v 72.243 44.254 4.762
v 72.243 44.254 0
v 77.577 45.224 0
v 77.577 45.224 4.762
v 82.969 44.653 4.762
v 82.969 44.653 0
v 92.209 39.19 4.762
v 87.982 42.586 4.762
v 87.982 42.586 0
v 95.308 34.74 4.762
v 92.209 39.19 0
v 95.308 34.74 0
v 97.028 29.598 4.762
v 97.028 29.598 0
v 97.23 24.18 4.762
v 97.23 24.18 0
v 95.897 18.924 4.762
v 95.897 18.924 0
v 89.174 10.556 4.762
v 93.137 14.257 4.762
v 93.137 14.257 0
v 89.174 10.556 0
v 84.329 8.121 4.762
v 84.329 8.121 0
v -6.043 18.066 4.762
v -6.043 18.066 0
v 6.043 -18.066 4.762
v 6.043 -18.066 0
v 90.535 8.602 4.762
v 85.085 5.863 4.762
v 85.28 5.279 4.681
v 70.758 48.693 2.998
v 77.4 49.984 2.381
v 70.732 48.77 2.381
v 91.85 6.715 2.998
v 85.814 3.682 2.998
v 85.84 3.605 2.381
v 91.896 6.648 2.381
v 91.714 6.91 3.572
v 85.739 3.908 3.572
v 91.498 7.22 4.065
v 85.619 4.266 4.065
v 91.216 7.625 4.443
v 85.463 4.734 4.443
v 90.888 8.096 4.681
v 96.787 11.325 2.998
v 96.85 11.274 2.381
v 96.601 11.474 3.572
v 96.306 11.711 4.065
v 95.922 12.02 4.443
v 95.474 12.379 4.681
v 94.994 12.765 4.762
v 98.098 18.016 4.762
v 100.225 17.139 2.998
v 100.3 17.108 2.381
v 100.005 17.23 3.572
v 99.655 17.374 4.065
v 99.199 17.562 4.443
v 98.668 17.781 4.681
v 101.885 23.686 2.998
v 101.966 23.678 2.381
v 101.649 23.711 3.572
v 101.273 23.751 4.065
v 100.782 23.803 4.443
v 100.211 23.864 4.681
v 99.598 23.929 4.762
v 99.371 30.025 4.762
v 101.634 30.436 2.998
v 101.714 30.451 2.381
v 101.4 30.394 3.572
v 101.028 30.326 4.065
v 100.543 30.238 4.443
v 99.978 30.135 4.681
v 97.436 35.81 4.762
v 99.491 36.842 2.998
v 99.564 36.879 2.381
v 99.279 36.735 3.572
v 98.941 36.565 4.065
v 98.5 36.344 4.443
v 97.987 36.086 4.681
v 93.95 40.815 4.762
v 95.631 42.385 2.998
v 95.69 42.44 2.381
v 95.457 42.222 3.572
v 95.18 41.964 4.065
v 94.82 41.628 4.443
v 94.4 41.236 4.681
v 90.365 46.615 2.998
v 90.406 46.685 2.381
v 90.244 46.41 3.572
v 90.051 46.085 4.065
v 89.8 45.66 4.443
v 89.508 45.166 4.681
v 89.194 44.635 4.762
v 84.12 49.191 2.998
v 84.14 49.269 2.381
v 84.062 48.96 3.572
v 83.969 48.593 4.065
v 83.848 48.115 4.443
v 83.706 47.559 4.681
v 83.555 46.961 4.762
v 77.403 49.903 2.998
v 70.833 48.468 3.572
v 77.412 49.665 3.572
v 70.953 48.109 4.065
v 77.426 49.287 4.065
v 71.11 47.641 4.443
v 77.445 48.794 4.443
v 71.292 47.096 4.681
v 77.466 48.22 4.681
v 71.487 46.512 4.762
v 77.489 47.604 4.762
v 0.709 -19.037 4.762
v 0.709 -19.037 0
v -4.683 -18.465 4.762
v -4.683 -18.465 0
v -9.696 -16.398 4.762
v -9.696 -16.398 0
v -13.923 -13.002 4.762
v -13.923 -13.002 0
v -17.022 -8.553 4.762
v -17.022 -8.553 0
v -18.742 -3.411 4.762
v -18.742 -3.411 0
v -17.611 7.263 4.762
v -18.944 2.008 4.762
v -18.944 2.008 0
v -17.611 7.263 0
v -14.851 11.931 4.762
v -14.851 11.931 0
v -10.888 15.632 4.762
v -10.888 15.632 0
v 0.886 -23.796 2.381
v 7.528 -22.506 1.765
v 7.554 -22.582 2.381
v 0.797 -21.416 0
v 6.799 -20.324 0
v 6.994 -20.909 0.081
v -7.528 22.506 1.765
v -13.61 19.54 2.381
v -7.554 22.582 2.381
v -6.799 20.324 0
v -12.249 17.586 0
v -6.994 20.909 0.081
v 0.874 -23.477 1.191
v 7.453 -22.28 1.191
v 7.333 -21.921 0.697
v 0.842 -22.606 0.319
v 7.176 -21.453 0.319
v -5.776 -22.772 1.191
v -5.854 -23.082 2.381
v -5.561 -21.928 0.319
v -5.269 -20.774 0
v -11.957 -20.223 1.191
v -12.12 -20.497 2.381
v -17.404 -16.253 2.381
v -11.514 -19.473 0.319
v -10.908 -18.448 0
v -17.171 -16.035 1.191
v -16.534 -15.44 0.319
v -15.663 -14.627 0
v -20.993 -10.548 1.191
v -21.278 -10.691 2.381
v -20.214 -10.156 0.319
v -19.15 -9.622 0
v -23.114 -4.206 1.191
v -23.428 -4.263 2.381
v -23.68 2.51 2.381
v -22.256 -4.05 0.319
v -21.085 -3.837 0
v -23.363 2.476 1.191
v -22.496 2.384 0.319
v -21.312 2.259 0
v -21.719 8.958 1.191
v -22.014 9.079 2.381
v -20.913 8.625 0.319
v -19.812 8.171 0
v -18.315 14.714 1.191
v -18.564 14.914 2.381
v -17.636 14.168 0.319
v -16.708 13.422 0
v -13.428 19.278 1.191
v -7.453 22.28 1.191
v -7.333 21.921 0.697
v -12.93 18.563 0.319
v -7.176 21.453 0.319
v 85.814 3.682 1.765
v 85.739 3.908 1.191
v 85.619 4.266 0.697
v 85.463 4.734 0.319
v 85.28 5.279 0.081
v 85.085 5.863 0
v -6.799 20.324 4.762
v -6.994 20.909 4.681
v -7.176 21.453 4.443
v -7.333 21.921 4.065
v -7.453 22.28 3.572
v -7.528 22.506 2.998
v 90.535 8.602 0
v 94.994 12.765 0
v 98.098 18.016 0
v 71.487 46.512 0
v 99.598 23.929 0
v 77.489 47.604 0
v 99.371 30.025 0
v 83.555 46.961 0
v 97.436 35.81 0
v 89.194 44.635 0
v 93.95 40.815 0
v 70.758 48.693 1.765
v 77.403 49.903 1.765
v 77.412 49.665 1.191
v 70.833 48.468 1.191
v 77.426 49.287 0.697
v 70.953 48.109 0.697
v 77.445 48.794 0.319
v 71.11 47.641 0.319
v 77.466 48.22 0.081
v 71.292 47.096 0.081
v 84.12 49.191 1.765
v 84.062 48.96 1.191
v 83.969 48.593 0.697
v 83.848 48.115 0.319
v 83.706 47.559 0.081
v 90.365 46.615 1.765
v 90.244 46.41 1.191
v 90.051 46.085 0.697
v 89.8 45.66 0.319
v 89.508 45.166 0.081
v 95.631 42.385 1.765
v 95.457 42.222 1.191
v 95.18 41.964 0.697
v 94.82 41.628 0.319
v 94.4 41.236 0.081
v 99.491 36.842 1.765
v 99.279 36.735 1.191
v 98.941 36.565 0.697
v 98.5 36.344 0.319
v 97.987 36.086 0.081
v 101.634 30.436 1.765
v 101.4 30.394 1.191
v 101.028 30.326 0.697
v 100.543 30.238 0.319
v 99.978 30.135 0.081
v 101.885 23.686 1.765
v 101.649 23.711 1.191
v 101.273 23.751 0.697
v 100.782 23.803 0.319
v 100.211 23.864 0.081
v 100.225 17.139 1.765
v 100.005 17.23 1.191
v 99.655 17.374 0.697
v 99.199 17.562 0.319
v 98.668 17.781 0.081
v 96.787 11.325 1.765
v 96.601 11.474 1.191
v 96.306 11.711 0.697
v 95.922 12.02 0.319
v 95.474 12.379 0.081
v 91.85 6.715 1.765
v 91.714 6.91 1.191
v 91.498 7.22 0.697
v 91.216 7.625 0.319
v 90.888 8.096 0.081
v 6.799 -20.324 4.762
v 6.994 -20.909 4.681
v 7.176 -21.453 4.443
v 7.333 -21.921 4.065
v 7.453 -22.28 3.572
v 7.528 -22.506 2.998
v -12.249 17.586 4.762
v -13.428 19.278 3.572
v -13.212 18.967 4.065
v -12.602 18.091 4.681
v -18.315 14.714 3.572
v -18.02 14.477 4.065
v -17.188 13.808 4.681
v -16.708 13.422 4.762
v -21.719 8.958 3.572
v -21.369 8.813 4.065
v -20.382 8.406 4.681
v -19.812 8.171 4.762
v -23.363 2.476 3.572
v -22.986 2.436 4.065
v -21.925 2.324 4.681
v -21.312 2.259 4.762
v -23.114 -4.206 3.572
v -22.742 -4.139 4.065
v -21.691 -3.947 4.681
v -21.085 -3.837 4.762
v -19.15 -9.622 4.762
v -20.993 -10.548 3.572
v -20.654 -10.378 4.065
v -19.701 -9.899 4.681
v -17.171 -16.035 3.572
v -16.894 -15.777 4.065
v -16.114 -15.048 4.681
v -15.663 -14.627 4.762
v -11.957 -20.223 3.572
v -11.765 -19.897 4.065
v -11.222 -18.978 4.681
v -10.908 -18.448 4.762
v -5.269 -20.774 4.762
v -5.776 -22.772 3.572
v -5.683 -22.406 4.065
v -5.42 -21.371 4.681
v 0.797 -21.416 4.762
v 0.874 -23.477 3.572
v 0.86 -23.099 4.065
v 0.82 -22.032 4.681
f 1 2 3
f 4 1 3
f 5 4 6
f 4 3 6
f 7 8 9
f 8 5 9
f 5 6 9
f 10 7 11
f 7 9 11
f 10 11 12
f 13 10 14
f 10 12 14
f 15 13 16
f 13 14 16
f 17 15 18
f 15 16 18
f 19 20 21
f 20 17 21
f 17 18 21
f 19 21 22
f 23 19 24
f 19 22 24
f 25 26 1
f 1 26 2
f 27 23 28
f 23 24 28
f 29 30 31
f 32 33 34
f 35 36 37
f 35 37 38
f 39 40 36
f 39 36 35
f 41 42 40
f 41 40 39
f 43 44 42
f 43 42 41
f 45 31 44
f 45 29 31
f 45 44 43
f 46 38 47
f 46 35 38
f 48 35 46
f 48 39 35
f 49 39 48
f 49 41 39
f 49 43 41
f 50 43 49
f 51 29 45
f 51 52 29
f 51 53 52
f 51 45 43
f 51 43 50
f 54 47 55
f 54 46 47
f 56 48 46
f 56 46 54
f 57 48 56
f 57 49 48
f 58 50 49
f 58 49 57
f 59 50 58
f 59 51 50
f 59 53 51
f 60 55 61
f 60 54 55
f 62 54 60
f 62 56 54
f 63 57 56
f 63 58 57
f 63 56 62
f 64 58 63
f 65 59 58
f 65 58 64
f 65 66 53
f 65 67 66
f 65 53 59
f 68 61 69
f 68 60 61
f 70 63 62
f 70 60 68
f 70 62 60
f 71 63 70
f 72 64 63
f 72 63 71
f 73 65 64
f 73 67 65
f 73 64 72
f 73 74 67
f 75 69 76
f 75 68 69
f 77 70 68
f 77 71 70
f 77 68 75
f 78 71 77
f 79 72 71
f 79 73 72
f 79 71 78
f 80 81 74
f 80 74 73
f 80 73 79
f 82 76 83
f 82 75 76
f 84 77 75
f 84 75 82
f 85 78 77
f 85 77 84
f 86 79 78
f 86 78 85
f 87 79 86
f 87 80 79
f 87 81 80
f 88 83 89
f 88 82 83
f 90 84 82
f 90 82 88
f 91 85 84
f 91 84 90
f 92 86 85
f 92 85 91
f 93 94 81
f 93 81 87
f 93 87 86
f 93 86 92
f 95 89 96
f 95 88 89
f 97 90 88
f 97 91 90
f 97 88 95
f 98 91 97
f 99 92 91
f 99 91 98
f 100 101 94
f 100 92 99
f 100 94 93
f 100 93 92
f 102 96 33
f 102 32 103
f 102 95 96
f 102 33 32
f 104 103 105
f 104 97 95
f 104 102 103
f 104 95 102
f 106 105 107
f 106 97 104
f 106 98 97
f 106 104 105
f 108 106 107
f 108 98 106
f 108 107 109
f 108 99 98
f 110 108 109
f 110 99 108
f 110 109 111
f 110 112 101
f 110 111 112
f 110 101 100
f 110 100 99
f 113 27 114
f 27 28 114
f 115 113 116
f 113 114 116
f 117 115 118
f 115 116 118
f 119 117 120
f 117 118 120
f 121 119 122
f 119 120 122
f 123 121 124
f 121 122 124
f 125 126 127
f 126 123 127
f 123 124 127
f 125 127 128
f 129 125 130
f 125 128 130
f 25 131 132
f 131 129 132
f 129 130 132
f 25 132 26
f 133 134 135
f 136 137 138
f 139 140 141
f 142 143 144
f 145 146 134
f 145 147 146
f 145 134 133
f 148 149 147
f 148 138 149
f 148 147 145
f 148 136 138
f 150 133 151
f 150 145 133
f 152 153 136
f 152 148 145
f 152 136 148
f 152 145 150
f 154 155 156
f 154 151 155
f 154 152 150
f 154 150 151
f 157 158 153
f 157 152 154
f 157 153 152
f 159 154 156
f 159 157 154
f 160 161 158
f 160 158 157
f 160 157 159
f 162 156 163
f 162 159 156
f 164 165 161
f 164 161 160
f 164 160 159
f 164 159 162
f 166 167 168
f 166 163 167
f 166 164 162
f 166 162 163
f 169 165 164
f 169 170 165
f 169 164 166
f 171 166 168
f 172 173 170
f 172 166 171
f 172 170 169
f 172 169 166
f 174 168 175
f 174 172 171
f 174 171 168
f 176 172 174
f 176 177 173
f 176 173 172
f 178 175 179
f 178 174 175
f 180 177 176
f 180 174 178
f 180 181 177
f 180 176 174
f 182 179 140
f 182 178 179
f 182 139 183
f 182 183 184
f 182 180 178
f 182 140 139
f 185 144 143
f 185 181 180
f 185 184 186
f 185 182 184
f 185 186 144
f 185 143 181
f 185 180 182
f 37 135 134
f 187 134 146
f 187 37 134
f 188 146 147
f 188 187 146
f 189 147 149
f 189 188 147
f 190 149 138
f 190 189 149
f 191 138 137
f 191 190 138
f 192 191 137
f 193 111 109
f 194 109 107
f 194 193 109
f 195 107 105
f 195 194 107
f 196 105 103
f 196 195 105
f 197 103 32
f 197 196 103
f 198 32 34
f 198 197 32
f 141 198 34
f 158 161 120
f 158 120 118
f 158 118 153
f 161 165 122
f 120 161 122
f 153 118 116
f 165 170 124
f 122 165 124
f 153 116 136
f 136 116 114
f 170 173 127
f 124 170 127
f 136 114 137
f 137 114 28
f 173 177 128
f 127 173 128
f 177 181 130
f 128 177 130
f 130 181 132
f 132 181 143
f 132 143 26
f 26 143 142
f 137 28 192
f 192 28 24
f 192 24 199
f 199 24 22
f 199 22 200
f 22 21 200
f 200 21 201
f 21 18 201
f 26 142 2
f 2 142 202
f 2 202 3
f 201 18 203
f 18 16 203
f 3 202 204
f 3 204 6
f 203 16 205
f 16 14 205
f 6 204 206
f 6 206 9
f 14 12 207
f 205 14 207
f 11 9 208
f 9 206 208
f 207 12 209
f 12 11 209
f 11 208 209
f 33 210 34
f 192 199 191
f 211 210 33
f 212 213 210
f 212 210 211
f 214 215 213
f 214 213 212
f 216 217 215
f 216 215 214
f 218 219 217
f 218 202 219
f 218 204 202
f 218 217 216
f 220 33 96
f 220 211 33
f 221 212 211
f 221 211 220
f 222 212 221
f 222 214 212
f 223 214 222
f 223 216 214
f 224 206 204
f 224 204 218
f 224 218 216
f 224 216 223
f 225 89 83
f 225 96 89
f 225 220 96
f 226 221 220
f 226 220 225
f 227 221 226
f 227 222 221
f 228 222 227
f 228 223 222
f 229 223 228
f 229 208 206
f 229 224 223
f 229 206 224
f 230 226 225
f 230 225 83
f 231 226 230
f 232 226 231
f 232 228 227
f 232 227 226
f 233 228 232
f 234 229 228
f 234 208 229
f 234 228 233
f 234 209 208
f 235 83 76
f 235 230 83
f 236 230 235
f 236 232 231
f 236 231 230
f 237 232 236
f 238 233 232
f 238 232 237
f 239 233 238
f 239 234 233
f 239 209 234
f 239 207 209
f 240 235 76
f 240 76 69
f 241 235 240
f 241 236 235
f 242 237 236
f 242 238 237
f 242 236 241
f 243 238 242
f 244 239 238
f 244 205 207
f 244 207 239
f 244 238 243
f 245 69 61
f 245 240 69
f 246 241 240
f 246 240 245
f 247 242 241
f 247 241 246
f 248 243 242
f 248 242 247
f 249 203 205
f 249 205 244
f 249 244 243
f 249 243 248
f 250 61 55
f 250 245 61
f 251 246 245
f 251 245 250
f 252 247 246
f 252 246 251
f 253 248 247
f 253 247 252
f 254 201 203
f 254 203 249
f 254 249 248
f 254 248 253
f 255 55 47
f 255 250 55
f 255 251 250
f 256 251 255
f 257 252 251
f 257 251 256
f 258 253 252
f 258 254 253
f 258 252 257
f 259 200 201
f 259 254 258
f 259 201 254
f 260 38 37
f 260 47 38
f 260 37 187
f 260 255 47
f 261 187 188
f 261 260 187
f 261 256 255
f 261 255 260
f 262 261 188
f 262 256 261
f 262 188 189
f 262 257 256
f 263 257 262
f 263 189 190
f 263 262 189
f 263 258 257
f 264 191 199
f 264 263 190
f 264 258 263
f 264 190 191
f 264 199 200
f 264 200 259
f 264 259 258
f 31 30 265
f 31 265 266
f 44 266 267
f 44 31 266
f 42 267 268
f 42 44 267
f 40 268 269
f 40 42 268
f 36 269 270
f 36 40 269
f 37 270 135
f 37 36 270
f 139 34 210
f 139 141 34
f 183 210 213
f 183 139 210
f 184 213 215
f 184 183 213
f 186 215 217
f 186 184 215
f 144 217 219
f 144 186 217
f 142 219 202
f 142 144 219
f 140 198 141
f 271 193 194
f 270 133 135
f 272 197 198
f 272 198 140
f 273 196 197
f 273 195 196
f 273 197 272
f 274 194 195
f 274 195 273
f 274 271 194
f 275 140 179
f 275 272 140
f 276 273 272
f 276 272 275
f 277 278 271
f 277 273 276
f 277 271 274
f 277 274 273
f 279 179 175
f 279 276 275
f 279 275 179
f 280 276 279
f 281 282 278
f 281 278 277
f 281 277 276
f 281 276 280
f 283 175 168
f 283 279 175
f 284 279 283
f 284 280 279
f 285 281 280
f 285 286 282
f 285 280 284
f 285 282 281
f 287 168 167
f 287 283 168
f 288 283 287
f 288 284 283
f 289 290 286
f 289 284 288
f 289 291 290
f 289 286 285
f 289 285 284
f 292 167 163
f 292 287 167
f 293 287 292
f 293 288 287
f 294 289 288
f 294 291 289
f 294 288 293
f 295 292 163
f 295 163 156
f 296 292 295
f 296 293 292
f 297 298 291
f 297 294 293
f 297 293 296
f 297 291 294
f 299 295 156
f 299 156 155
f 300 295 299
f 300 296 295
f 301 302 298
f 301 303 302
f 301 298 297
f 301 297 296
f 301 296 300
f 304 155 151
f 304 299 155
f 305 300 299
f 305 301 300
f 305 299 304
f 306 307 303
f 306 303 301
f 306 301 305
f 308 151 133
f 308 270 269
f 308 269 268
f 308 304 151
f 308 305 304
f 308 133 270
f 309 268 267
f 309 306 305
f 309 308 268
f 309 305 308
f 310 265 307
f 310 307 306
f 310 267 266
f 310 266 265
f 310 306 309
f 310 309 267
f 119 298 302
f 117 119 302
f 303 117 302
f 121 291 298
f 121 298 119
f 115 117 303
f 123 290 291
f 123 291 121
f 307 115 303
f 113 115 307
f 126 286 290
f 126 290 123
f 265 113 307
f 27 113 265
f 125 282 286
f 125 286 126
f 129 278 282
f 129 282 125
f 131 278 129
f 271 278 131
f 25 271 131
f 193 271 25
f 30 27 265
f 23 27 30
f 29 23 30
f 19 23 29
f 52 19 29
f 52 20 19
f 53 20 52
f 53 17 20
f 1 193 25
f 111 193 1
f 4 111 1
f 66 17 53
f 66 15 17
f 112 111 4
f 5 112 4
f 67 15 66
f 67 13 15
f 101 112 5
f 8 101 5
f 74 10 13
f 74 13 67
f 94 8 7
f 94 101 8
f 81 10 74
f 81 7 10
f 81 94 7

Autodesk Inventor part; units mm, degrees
ref_plane "YZ Plane" through (0, 0, 0) normal (1, 0, 0) x (0, 1, 0)
ref_plane "XZ Plane" through (0, 0, 0) normal (0, 1, 0) x (-1, 0, 0)
ref_plane "XY Plane" through (0, 0, 0) normal (0, 0, 1) x (1, 0, 0)
sketch "Sketch1" plane through (0, 0, 0) normal (0, 0, 1) x (1, 0, 0)
  arc A0 (-6.0433, 18.066) -> (6.0433, -18.066) centre (0, 0) ccw
  arc A1 (84.3294, 8.1215) -> (72.2428, 44.2536) centre (78.2861, 26.1876) ccw
  line L0 (-6.0433, 18.066) -> (72.2428, 44.2536)
  line L1 (84.3294, 8.1215) -> (6.0433, -18.066)
  arc A2 (-7.5541, 22.5825) -> (7.5541, -22.5825) centre (0, 0) ccw
  arc A3 (85.8402, 3.605) -> (70.732, 48.7701) centre (78.2861, 26.1876) ccw
  line L2 (7.5541, -22.5825) -> (85.8402, 3.605)
  line L3 (70.732, 48.7701) -> (-7.5541, 22.5825)
  dimension "d0" = 19.05
  dimension "d1" = 82.55
  dimension "d2" = 4.7625
extrude "Extrusion1" add sketch "Sketch1" along normal blind 4.7625
fillet "Fillet1" radius 2.3813 8 edges at (-22.5825, -7.5541, 0) (46.6972, -9.4887, 0) (100.8686, 33.7417, 0) (31.5889, 35.6763, 0) (100.8686, 33.7417, 4.7625) (46.6972, -9.4887, 4.7625) (-22.5825, -7.5541, 4.7625) (31.5889, 35.6763, 4.7625)
properties part number "Belt_HorizontalIntake_Front" material "High Density Polyethylene"
